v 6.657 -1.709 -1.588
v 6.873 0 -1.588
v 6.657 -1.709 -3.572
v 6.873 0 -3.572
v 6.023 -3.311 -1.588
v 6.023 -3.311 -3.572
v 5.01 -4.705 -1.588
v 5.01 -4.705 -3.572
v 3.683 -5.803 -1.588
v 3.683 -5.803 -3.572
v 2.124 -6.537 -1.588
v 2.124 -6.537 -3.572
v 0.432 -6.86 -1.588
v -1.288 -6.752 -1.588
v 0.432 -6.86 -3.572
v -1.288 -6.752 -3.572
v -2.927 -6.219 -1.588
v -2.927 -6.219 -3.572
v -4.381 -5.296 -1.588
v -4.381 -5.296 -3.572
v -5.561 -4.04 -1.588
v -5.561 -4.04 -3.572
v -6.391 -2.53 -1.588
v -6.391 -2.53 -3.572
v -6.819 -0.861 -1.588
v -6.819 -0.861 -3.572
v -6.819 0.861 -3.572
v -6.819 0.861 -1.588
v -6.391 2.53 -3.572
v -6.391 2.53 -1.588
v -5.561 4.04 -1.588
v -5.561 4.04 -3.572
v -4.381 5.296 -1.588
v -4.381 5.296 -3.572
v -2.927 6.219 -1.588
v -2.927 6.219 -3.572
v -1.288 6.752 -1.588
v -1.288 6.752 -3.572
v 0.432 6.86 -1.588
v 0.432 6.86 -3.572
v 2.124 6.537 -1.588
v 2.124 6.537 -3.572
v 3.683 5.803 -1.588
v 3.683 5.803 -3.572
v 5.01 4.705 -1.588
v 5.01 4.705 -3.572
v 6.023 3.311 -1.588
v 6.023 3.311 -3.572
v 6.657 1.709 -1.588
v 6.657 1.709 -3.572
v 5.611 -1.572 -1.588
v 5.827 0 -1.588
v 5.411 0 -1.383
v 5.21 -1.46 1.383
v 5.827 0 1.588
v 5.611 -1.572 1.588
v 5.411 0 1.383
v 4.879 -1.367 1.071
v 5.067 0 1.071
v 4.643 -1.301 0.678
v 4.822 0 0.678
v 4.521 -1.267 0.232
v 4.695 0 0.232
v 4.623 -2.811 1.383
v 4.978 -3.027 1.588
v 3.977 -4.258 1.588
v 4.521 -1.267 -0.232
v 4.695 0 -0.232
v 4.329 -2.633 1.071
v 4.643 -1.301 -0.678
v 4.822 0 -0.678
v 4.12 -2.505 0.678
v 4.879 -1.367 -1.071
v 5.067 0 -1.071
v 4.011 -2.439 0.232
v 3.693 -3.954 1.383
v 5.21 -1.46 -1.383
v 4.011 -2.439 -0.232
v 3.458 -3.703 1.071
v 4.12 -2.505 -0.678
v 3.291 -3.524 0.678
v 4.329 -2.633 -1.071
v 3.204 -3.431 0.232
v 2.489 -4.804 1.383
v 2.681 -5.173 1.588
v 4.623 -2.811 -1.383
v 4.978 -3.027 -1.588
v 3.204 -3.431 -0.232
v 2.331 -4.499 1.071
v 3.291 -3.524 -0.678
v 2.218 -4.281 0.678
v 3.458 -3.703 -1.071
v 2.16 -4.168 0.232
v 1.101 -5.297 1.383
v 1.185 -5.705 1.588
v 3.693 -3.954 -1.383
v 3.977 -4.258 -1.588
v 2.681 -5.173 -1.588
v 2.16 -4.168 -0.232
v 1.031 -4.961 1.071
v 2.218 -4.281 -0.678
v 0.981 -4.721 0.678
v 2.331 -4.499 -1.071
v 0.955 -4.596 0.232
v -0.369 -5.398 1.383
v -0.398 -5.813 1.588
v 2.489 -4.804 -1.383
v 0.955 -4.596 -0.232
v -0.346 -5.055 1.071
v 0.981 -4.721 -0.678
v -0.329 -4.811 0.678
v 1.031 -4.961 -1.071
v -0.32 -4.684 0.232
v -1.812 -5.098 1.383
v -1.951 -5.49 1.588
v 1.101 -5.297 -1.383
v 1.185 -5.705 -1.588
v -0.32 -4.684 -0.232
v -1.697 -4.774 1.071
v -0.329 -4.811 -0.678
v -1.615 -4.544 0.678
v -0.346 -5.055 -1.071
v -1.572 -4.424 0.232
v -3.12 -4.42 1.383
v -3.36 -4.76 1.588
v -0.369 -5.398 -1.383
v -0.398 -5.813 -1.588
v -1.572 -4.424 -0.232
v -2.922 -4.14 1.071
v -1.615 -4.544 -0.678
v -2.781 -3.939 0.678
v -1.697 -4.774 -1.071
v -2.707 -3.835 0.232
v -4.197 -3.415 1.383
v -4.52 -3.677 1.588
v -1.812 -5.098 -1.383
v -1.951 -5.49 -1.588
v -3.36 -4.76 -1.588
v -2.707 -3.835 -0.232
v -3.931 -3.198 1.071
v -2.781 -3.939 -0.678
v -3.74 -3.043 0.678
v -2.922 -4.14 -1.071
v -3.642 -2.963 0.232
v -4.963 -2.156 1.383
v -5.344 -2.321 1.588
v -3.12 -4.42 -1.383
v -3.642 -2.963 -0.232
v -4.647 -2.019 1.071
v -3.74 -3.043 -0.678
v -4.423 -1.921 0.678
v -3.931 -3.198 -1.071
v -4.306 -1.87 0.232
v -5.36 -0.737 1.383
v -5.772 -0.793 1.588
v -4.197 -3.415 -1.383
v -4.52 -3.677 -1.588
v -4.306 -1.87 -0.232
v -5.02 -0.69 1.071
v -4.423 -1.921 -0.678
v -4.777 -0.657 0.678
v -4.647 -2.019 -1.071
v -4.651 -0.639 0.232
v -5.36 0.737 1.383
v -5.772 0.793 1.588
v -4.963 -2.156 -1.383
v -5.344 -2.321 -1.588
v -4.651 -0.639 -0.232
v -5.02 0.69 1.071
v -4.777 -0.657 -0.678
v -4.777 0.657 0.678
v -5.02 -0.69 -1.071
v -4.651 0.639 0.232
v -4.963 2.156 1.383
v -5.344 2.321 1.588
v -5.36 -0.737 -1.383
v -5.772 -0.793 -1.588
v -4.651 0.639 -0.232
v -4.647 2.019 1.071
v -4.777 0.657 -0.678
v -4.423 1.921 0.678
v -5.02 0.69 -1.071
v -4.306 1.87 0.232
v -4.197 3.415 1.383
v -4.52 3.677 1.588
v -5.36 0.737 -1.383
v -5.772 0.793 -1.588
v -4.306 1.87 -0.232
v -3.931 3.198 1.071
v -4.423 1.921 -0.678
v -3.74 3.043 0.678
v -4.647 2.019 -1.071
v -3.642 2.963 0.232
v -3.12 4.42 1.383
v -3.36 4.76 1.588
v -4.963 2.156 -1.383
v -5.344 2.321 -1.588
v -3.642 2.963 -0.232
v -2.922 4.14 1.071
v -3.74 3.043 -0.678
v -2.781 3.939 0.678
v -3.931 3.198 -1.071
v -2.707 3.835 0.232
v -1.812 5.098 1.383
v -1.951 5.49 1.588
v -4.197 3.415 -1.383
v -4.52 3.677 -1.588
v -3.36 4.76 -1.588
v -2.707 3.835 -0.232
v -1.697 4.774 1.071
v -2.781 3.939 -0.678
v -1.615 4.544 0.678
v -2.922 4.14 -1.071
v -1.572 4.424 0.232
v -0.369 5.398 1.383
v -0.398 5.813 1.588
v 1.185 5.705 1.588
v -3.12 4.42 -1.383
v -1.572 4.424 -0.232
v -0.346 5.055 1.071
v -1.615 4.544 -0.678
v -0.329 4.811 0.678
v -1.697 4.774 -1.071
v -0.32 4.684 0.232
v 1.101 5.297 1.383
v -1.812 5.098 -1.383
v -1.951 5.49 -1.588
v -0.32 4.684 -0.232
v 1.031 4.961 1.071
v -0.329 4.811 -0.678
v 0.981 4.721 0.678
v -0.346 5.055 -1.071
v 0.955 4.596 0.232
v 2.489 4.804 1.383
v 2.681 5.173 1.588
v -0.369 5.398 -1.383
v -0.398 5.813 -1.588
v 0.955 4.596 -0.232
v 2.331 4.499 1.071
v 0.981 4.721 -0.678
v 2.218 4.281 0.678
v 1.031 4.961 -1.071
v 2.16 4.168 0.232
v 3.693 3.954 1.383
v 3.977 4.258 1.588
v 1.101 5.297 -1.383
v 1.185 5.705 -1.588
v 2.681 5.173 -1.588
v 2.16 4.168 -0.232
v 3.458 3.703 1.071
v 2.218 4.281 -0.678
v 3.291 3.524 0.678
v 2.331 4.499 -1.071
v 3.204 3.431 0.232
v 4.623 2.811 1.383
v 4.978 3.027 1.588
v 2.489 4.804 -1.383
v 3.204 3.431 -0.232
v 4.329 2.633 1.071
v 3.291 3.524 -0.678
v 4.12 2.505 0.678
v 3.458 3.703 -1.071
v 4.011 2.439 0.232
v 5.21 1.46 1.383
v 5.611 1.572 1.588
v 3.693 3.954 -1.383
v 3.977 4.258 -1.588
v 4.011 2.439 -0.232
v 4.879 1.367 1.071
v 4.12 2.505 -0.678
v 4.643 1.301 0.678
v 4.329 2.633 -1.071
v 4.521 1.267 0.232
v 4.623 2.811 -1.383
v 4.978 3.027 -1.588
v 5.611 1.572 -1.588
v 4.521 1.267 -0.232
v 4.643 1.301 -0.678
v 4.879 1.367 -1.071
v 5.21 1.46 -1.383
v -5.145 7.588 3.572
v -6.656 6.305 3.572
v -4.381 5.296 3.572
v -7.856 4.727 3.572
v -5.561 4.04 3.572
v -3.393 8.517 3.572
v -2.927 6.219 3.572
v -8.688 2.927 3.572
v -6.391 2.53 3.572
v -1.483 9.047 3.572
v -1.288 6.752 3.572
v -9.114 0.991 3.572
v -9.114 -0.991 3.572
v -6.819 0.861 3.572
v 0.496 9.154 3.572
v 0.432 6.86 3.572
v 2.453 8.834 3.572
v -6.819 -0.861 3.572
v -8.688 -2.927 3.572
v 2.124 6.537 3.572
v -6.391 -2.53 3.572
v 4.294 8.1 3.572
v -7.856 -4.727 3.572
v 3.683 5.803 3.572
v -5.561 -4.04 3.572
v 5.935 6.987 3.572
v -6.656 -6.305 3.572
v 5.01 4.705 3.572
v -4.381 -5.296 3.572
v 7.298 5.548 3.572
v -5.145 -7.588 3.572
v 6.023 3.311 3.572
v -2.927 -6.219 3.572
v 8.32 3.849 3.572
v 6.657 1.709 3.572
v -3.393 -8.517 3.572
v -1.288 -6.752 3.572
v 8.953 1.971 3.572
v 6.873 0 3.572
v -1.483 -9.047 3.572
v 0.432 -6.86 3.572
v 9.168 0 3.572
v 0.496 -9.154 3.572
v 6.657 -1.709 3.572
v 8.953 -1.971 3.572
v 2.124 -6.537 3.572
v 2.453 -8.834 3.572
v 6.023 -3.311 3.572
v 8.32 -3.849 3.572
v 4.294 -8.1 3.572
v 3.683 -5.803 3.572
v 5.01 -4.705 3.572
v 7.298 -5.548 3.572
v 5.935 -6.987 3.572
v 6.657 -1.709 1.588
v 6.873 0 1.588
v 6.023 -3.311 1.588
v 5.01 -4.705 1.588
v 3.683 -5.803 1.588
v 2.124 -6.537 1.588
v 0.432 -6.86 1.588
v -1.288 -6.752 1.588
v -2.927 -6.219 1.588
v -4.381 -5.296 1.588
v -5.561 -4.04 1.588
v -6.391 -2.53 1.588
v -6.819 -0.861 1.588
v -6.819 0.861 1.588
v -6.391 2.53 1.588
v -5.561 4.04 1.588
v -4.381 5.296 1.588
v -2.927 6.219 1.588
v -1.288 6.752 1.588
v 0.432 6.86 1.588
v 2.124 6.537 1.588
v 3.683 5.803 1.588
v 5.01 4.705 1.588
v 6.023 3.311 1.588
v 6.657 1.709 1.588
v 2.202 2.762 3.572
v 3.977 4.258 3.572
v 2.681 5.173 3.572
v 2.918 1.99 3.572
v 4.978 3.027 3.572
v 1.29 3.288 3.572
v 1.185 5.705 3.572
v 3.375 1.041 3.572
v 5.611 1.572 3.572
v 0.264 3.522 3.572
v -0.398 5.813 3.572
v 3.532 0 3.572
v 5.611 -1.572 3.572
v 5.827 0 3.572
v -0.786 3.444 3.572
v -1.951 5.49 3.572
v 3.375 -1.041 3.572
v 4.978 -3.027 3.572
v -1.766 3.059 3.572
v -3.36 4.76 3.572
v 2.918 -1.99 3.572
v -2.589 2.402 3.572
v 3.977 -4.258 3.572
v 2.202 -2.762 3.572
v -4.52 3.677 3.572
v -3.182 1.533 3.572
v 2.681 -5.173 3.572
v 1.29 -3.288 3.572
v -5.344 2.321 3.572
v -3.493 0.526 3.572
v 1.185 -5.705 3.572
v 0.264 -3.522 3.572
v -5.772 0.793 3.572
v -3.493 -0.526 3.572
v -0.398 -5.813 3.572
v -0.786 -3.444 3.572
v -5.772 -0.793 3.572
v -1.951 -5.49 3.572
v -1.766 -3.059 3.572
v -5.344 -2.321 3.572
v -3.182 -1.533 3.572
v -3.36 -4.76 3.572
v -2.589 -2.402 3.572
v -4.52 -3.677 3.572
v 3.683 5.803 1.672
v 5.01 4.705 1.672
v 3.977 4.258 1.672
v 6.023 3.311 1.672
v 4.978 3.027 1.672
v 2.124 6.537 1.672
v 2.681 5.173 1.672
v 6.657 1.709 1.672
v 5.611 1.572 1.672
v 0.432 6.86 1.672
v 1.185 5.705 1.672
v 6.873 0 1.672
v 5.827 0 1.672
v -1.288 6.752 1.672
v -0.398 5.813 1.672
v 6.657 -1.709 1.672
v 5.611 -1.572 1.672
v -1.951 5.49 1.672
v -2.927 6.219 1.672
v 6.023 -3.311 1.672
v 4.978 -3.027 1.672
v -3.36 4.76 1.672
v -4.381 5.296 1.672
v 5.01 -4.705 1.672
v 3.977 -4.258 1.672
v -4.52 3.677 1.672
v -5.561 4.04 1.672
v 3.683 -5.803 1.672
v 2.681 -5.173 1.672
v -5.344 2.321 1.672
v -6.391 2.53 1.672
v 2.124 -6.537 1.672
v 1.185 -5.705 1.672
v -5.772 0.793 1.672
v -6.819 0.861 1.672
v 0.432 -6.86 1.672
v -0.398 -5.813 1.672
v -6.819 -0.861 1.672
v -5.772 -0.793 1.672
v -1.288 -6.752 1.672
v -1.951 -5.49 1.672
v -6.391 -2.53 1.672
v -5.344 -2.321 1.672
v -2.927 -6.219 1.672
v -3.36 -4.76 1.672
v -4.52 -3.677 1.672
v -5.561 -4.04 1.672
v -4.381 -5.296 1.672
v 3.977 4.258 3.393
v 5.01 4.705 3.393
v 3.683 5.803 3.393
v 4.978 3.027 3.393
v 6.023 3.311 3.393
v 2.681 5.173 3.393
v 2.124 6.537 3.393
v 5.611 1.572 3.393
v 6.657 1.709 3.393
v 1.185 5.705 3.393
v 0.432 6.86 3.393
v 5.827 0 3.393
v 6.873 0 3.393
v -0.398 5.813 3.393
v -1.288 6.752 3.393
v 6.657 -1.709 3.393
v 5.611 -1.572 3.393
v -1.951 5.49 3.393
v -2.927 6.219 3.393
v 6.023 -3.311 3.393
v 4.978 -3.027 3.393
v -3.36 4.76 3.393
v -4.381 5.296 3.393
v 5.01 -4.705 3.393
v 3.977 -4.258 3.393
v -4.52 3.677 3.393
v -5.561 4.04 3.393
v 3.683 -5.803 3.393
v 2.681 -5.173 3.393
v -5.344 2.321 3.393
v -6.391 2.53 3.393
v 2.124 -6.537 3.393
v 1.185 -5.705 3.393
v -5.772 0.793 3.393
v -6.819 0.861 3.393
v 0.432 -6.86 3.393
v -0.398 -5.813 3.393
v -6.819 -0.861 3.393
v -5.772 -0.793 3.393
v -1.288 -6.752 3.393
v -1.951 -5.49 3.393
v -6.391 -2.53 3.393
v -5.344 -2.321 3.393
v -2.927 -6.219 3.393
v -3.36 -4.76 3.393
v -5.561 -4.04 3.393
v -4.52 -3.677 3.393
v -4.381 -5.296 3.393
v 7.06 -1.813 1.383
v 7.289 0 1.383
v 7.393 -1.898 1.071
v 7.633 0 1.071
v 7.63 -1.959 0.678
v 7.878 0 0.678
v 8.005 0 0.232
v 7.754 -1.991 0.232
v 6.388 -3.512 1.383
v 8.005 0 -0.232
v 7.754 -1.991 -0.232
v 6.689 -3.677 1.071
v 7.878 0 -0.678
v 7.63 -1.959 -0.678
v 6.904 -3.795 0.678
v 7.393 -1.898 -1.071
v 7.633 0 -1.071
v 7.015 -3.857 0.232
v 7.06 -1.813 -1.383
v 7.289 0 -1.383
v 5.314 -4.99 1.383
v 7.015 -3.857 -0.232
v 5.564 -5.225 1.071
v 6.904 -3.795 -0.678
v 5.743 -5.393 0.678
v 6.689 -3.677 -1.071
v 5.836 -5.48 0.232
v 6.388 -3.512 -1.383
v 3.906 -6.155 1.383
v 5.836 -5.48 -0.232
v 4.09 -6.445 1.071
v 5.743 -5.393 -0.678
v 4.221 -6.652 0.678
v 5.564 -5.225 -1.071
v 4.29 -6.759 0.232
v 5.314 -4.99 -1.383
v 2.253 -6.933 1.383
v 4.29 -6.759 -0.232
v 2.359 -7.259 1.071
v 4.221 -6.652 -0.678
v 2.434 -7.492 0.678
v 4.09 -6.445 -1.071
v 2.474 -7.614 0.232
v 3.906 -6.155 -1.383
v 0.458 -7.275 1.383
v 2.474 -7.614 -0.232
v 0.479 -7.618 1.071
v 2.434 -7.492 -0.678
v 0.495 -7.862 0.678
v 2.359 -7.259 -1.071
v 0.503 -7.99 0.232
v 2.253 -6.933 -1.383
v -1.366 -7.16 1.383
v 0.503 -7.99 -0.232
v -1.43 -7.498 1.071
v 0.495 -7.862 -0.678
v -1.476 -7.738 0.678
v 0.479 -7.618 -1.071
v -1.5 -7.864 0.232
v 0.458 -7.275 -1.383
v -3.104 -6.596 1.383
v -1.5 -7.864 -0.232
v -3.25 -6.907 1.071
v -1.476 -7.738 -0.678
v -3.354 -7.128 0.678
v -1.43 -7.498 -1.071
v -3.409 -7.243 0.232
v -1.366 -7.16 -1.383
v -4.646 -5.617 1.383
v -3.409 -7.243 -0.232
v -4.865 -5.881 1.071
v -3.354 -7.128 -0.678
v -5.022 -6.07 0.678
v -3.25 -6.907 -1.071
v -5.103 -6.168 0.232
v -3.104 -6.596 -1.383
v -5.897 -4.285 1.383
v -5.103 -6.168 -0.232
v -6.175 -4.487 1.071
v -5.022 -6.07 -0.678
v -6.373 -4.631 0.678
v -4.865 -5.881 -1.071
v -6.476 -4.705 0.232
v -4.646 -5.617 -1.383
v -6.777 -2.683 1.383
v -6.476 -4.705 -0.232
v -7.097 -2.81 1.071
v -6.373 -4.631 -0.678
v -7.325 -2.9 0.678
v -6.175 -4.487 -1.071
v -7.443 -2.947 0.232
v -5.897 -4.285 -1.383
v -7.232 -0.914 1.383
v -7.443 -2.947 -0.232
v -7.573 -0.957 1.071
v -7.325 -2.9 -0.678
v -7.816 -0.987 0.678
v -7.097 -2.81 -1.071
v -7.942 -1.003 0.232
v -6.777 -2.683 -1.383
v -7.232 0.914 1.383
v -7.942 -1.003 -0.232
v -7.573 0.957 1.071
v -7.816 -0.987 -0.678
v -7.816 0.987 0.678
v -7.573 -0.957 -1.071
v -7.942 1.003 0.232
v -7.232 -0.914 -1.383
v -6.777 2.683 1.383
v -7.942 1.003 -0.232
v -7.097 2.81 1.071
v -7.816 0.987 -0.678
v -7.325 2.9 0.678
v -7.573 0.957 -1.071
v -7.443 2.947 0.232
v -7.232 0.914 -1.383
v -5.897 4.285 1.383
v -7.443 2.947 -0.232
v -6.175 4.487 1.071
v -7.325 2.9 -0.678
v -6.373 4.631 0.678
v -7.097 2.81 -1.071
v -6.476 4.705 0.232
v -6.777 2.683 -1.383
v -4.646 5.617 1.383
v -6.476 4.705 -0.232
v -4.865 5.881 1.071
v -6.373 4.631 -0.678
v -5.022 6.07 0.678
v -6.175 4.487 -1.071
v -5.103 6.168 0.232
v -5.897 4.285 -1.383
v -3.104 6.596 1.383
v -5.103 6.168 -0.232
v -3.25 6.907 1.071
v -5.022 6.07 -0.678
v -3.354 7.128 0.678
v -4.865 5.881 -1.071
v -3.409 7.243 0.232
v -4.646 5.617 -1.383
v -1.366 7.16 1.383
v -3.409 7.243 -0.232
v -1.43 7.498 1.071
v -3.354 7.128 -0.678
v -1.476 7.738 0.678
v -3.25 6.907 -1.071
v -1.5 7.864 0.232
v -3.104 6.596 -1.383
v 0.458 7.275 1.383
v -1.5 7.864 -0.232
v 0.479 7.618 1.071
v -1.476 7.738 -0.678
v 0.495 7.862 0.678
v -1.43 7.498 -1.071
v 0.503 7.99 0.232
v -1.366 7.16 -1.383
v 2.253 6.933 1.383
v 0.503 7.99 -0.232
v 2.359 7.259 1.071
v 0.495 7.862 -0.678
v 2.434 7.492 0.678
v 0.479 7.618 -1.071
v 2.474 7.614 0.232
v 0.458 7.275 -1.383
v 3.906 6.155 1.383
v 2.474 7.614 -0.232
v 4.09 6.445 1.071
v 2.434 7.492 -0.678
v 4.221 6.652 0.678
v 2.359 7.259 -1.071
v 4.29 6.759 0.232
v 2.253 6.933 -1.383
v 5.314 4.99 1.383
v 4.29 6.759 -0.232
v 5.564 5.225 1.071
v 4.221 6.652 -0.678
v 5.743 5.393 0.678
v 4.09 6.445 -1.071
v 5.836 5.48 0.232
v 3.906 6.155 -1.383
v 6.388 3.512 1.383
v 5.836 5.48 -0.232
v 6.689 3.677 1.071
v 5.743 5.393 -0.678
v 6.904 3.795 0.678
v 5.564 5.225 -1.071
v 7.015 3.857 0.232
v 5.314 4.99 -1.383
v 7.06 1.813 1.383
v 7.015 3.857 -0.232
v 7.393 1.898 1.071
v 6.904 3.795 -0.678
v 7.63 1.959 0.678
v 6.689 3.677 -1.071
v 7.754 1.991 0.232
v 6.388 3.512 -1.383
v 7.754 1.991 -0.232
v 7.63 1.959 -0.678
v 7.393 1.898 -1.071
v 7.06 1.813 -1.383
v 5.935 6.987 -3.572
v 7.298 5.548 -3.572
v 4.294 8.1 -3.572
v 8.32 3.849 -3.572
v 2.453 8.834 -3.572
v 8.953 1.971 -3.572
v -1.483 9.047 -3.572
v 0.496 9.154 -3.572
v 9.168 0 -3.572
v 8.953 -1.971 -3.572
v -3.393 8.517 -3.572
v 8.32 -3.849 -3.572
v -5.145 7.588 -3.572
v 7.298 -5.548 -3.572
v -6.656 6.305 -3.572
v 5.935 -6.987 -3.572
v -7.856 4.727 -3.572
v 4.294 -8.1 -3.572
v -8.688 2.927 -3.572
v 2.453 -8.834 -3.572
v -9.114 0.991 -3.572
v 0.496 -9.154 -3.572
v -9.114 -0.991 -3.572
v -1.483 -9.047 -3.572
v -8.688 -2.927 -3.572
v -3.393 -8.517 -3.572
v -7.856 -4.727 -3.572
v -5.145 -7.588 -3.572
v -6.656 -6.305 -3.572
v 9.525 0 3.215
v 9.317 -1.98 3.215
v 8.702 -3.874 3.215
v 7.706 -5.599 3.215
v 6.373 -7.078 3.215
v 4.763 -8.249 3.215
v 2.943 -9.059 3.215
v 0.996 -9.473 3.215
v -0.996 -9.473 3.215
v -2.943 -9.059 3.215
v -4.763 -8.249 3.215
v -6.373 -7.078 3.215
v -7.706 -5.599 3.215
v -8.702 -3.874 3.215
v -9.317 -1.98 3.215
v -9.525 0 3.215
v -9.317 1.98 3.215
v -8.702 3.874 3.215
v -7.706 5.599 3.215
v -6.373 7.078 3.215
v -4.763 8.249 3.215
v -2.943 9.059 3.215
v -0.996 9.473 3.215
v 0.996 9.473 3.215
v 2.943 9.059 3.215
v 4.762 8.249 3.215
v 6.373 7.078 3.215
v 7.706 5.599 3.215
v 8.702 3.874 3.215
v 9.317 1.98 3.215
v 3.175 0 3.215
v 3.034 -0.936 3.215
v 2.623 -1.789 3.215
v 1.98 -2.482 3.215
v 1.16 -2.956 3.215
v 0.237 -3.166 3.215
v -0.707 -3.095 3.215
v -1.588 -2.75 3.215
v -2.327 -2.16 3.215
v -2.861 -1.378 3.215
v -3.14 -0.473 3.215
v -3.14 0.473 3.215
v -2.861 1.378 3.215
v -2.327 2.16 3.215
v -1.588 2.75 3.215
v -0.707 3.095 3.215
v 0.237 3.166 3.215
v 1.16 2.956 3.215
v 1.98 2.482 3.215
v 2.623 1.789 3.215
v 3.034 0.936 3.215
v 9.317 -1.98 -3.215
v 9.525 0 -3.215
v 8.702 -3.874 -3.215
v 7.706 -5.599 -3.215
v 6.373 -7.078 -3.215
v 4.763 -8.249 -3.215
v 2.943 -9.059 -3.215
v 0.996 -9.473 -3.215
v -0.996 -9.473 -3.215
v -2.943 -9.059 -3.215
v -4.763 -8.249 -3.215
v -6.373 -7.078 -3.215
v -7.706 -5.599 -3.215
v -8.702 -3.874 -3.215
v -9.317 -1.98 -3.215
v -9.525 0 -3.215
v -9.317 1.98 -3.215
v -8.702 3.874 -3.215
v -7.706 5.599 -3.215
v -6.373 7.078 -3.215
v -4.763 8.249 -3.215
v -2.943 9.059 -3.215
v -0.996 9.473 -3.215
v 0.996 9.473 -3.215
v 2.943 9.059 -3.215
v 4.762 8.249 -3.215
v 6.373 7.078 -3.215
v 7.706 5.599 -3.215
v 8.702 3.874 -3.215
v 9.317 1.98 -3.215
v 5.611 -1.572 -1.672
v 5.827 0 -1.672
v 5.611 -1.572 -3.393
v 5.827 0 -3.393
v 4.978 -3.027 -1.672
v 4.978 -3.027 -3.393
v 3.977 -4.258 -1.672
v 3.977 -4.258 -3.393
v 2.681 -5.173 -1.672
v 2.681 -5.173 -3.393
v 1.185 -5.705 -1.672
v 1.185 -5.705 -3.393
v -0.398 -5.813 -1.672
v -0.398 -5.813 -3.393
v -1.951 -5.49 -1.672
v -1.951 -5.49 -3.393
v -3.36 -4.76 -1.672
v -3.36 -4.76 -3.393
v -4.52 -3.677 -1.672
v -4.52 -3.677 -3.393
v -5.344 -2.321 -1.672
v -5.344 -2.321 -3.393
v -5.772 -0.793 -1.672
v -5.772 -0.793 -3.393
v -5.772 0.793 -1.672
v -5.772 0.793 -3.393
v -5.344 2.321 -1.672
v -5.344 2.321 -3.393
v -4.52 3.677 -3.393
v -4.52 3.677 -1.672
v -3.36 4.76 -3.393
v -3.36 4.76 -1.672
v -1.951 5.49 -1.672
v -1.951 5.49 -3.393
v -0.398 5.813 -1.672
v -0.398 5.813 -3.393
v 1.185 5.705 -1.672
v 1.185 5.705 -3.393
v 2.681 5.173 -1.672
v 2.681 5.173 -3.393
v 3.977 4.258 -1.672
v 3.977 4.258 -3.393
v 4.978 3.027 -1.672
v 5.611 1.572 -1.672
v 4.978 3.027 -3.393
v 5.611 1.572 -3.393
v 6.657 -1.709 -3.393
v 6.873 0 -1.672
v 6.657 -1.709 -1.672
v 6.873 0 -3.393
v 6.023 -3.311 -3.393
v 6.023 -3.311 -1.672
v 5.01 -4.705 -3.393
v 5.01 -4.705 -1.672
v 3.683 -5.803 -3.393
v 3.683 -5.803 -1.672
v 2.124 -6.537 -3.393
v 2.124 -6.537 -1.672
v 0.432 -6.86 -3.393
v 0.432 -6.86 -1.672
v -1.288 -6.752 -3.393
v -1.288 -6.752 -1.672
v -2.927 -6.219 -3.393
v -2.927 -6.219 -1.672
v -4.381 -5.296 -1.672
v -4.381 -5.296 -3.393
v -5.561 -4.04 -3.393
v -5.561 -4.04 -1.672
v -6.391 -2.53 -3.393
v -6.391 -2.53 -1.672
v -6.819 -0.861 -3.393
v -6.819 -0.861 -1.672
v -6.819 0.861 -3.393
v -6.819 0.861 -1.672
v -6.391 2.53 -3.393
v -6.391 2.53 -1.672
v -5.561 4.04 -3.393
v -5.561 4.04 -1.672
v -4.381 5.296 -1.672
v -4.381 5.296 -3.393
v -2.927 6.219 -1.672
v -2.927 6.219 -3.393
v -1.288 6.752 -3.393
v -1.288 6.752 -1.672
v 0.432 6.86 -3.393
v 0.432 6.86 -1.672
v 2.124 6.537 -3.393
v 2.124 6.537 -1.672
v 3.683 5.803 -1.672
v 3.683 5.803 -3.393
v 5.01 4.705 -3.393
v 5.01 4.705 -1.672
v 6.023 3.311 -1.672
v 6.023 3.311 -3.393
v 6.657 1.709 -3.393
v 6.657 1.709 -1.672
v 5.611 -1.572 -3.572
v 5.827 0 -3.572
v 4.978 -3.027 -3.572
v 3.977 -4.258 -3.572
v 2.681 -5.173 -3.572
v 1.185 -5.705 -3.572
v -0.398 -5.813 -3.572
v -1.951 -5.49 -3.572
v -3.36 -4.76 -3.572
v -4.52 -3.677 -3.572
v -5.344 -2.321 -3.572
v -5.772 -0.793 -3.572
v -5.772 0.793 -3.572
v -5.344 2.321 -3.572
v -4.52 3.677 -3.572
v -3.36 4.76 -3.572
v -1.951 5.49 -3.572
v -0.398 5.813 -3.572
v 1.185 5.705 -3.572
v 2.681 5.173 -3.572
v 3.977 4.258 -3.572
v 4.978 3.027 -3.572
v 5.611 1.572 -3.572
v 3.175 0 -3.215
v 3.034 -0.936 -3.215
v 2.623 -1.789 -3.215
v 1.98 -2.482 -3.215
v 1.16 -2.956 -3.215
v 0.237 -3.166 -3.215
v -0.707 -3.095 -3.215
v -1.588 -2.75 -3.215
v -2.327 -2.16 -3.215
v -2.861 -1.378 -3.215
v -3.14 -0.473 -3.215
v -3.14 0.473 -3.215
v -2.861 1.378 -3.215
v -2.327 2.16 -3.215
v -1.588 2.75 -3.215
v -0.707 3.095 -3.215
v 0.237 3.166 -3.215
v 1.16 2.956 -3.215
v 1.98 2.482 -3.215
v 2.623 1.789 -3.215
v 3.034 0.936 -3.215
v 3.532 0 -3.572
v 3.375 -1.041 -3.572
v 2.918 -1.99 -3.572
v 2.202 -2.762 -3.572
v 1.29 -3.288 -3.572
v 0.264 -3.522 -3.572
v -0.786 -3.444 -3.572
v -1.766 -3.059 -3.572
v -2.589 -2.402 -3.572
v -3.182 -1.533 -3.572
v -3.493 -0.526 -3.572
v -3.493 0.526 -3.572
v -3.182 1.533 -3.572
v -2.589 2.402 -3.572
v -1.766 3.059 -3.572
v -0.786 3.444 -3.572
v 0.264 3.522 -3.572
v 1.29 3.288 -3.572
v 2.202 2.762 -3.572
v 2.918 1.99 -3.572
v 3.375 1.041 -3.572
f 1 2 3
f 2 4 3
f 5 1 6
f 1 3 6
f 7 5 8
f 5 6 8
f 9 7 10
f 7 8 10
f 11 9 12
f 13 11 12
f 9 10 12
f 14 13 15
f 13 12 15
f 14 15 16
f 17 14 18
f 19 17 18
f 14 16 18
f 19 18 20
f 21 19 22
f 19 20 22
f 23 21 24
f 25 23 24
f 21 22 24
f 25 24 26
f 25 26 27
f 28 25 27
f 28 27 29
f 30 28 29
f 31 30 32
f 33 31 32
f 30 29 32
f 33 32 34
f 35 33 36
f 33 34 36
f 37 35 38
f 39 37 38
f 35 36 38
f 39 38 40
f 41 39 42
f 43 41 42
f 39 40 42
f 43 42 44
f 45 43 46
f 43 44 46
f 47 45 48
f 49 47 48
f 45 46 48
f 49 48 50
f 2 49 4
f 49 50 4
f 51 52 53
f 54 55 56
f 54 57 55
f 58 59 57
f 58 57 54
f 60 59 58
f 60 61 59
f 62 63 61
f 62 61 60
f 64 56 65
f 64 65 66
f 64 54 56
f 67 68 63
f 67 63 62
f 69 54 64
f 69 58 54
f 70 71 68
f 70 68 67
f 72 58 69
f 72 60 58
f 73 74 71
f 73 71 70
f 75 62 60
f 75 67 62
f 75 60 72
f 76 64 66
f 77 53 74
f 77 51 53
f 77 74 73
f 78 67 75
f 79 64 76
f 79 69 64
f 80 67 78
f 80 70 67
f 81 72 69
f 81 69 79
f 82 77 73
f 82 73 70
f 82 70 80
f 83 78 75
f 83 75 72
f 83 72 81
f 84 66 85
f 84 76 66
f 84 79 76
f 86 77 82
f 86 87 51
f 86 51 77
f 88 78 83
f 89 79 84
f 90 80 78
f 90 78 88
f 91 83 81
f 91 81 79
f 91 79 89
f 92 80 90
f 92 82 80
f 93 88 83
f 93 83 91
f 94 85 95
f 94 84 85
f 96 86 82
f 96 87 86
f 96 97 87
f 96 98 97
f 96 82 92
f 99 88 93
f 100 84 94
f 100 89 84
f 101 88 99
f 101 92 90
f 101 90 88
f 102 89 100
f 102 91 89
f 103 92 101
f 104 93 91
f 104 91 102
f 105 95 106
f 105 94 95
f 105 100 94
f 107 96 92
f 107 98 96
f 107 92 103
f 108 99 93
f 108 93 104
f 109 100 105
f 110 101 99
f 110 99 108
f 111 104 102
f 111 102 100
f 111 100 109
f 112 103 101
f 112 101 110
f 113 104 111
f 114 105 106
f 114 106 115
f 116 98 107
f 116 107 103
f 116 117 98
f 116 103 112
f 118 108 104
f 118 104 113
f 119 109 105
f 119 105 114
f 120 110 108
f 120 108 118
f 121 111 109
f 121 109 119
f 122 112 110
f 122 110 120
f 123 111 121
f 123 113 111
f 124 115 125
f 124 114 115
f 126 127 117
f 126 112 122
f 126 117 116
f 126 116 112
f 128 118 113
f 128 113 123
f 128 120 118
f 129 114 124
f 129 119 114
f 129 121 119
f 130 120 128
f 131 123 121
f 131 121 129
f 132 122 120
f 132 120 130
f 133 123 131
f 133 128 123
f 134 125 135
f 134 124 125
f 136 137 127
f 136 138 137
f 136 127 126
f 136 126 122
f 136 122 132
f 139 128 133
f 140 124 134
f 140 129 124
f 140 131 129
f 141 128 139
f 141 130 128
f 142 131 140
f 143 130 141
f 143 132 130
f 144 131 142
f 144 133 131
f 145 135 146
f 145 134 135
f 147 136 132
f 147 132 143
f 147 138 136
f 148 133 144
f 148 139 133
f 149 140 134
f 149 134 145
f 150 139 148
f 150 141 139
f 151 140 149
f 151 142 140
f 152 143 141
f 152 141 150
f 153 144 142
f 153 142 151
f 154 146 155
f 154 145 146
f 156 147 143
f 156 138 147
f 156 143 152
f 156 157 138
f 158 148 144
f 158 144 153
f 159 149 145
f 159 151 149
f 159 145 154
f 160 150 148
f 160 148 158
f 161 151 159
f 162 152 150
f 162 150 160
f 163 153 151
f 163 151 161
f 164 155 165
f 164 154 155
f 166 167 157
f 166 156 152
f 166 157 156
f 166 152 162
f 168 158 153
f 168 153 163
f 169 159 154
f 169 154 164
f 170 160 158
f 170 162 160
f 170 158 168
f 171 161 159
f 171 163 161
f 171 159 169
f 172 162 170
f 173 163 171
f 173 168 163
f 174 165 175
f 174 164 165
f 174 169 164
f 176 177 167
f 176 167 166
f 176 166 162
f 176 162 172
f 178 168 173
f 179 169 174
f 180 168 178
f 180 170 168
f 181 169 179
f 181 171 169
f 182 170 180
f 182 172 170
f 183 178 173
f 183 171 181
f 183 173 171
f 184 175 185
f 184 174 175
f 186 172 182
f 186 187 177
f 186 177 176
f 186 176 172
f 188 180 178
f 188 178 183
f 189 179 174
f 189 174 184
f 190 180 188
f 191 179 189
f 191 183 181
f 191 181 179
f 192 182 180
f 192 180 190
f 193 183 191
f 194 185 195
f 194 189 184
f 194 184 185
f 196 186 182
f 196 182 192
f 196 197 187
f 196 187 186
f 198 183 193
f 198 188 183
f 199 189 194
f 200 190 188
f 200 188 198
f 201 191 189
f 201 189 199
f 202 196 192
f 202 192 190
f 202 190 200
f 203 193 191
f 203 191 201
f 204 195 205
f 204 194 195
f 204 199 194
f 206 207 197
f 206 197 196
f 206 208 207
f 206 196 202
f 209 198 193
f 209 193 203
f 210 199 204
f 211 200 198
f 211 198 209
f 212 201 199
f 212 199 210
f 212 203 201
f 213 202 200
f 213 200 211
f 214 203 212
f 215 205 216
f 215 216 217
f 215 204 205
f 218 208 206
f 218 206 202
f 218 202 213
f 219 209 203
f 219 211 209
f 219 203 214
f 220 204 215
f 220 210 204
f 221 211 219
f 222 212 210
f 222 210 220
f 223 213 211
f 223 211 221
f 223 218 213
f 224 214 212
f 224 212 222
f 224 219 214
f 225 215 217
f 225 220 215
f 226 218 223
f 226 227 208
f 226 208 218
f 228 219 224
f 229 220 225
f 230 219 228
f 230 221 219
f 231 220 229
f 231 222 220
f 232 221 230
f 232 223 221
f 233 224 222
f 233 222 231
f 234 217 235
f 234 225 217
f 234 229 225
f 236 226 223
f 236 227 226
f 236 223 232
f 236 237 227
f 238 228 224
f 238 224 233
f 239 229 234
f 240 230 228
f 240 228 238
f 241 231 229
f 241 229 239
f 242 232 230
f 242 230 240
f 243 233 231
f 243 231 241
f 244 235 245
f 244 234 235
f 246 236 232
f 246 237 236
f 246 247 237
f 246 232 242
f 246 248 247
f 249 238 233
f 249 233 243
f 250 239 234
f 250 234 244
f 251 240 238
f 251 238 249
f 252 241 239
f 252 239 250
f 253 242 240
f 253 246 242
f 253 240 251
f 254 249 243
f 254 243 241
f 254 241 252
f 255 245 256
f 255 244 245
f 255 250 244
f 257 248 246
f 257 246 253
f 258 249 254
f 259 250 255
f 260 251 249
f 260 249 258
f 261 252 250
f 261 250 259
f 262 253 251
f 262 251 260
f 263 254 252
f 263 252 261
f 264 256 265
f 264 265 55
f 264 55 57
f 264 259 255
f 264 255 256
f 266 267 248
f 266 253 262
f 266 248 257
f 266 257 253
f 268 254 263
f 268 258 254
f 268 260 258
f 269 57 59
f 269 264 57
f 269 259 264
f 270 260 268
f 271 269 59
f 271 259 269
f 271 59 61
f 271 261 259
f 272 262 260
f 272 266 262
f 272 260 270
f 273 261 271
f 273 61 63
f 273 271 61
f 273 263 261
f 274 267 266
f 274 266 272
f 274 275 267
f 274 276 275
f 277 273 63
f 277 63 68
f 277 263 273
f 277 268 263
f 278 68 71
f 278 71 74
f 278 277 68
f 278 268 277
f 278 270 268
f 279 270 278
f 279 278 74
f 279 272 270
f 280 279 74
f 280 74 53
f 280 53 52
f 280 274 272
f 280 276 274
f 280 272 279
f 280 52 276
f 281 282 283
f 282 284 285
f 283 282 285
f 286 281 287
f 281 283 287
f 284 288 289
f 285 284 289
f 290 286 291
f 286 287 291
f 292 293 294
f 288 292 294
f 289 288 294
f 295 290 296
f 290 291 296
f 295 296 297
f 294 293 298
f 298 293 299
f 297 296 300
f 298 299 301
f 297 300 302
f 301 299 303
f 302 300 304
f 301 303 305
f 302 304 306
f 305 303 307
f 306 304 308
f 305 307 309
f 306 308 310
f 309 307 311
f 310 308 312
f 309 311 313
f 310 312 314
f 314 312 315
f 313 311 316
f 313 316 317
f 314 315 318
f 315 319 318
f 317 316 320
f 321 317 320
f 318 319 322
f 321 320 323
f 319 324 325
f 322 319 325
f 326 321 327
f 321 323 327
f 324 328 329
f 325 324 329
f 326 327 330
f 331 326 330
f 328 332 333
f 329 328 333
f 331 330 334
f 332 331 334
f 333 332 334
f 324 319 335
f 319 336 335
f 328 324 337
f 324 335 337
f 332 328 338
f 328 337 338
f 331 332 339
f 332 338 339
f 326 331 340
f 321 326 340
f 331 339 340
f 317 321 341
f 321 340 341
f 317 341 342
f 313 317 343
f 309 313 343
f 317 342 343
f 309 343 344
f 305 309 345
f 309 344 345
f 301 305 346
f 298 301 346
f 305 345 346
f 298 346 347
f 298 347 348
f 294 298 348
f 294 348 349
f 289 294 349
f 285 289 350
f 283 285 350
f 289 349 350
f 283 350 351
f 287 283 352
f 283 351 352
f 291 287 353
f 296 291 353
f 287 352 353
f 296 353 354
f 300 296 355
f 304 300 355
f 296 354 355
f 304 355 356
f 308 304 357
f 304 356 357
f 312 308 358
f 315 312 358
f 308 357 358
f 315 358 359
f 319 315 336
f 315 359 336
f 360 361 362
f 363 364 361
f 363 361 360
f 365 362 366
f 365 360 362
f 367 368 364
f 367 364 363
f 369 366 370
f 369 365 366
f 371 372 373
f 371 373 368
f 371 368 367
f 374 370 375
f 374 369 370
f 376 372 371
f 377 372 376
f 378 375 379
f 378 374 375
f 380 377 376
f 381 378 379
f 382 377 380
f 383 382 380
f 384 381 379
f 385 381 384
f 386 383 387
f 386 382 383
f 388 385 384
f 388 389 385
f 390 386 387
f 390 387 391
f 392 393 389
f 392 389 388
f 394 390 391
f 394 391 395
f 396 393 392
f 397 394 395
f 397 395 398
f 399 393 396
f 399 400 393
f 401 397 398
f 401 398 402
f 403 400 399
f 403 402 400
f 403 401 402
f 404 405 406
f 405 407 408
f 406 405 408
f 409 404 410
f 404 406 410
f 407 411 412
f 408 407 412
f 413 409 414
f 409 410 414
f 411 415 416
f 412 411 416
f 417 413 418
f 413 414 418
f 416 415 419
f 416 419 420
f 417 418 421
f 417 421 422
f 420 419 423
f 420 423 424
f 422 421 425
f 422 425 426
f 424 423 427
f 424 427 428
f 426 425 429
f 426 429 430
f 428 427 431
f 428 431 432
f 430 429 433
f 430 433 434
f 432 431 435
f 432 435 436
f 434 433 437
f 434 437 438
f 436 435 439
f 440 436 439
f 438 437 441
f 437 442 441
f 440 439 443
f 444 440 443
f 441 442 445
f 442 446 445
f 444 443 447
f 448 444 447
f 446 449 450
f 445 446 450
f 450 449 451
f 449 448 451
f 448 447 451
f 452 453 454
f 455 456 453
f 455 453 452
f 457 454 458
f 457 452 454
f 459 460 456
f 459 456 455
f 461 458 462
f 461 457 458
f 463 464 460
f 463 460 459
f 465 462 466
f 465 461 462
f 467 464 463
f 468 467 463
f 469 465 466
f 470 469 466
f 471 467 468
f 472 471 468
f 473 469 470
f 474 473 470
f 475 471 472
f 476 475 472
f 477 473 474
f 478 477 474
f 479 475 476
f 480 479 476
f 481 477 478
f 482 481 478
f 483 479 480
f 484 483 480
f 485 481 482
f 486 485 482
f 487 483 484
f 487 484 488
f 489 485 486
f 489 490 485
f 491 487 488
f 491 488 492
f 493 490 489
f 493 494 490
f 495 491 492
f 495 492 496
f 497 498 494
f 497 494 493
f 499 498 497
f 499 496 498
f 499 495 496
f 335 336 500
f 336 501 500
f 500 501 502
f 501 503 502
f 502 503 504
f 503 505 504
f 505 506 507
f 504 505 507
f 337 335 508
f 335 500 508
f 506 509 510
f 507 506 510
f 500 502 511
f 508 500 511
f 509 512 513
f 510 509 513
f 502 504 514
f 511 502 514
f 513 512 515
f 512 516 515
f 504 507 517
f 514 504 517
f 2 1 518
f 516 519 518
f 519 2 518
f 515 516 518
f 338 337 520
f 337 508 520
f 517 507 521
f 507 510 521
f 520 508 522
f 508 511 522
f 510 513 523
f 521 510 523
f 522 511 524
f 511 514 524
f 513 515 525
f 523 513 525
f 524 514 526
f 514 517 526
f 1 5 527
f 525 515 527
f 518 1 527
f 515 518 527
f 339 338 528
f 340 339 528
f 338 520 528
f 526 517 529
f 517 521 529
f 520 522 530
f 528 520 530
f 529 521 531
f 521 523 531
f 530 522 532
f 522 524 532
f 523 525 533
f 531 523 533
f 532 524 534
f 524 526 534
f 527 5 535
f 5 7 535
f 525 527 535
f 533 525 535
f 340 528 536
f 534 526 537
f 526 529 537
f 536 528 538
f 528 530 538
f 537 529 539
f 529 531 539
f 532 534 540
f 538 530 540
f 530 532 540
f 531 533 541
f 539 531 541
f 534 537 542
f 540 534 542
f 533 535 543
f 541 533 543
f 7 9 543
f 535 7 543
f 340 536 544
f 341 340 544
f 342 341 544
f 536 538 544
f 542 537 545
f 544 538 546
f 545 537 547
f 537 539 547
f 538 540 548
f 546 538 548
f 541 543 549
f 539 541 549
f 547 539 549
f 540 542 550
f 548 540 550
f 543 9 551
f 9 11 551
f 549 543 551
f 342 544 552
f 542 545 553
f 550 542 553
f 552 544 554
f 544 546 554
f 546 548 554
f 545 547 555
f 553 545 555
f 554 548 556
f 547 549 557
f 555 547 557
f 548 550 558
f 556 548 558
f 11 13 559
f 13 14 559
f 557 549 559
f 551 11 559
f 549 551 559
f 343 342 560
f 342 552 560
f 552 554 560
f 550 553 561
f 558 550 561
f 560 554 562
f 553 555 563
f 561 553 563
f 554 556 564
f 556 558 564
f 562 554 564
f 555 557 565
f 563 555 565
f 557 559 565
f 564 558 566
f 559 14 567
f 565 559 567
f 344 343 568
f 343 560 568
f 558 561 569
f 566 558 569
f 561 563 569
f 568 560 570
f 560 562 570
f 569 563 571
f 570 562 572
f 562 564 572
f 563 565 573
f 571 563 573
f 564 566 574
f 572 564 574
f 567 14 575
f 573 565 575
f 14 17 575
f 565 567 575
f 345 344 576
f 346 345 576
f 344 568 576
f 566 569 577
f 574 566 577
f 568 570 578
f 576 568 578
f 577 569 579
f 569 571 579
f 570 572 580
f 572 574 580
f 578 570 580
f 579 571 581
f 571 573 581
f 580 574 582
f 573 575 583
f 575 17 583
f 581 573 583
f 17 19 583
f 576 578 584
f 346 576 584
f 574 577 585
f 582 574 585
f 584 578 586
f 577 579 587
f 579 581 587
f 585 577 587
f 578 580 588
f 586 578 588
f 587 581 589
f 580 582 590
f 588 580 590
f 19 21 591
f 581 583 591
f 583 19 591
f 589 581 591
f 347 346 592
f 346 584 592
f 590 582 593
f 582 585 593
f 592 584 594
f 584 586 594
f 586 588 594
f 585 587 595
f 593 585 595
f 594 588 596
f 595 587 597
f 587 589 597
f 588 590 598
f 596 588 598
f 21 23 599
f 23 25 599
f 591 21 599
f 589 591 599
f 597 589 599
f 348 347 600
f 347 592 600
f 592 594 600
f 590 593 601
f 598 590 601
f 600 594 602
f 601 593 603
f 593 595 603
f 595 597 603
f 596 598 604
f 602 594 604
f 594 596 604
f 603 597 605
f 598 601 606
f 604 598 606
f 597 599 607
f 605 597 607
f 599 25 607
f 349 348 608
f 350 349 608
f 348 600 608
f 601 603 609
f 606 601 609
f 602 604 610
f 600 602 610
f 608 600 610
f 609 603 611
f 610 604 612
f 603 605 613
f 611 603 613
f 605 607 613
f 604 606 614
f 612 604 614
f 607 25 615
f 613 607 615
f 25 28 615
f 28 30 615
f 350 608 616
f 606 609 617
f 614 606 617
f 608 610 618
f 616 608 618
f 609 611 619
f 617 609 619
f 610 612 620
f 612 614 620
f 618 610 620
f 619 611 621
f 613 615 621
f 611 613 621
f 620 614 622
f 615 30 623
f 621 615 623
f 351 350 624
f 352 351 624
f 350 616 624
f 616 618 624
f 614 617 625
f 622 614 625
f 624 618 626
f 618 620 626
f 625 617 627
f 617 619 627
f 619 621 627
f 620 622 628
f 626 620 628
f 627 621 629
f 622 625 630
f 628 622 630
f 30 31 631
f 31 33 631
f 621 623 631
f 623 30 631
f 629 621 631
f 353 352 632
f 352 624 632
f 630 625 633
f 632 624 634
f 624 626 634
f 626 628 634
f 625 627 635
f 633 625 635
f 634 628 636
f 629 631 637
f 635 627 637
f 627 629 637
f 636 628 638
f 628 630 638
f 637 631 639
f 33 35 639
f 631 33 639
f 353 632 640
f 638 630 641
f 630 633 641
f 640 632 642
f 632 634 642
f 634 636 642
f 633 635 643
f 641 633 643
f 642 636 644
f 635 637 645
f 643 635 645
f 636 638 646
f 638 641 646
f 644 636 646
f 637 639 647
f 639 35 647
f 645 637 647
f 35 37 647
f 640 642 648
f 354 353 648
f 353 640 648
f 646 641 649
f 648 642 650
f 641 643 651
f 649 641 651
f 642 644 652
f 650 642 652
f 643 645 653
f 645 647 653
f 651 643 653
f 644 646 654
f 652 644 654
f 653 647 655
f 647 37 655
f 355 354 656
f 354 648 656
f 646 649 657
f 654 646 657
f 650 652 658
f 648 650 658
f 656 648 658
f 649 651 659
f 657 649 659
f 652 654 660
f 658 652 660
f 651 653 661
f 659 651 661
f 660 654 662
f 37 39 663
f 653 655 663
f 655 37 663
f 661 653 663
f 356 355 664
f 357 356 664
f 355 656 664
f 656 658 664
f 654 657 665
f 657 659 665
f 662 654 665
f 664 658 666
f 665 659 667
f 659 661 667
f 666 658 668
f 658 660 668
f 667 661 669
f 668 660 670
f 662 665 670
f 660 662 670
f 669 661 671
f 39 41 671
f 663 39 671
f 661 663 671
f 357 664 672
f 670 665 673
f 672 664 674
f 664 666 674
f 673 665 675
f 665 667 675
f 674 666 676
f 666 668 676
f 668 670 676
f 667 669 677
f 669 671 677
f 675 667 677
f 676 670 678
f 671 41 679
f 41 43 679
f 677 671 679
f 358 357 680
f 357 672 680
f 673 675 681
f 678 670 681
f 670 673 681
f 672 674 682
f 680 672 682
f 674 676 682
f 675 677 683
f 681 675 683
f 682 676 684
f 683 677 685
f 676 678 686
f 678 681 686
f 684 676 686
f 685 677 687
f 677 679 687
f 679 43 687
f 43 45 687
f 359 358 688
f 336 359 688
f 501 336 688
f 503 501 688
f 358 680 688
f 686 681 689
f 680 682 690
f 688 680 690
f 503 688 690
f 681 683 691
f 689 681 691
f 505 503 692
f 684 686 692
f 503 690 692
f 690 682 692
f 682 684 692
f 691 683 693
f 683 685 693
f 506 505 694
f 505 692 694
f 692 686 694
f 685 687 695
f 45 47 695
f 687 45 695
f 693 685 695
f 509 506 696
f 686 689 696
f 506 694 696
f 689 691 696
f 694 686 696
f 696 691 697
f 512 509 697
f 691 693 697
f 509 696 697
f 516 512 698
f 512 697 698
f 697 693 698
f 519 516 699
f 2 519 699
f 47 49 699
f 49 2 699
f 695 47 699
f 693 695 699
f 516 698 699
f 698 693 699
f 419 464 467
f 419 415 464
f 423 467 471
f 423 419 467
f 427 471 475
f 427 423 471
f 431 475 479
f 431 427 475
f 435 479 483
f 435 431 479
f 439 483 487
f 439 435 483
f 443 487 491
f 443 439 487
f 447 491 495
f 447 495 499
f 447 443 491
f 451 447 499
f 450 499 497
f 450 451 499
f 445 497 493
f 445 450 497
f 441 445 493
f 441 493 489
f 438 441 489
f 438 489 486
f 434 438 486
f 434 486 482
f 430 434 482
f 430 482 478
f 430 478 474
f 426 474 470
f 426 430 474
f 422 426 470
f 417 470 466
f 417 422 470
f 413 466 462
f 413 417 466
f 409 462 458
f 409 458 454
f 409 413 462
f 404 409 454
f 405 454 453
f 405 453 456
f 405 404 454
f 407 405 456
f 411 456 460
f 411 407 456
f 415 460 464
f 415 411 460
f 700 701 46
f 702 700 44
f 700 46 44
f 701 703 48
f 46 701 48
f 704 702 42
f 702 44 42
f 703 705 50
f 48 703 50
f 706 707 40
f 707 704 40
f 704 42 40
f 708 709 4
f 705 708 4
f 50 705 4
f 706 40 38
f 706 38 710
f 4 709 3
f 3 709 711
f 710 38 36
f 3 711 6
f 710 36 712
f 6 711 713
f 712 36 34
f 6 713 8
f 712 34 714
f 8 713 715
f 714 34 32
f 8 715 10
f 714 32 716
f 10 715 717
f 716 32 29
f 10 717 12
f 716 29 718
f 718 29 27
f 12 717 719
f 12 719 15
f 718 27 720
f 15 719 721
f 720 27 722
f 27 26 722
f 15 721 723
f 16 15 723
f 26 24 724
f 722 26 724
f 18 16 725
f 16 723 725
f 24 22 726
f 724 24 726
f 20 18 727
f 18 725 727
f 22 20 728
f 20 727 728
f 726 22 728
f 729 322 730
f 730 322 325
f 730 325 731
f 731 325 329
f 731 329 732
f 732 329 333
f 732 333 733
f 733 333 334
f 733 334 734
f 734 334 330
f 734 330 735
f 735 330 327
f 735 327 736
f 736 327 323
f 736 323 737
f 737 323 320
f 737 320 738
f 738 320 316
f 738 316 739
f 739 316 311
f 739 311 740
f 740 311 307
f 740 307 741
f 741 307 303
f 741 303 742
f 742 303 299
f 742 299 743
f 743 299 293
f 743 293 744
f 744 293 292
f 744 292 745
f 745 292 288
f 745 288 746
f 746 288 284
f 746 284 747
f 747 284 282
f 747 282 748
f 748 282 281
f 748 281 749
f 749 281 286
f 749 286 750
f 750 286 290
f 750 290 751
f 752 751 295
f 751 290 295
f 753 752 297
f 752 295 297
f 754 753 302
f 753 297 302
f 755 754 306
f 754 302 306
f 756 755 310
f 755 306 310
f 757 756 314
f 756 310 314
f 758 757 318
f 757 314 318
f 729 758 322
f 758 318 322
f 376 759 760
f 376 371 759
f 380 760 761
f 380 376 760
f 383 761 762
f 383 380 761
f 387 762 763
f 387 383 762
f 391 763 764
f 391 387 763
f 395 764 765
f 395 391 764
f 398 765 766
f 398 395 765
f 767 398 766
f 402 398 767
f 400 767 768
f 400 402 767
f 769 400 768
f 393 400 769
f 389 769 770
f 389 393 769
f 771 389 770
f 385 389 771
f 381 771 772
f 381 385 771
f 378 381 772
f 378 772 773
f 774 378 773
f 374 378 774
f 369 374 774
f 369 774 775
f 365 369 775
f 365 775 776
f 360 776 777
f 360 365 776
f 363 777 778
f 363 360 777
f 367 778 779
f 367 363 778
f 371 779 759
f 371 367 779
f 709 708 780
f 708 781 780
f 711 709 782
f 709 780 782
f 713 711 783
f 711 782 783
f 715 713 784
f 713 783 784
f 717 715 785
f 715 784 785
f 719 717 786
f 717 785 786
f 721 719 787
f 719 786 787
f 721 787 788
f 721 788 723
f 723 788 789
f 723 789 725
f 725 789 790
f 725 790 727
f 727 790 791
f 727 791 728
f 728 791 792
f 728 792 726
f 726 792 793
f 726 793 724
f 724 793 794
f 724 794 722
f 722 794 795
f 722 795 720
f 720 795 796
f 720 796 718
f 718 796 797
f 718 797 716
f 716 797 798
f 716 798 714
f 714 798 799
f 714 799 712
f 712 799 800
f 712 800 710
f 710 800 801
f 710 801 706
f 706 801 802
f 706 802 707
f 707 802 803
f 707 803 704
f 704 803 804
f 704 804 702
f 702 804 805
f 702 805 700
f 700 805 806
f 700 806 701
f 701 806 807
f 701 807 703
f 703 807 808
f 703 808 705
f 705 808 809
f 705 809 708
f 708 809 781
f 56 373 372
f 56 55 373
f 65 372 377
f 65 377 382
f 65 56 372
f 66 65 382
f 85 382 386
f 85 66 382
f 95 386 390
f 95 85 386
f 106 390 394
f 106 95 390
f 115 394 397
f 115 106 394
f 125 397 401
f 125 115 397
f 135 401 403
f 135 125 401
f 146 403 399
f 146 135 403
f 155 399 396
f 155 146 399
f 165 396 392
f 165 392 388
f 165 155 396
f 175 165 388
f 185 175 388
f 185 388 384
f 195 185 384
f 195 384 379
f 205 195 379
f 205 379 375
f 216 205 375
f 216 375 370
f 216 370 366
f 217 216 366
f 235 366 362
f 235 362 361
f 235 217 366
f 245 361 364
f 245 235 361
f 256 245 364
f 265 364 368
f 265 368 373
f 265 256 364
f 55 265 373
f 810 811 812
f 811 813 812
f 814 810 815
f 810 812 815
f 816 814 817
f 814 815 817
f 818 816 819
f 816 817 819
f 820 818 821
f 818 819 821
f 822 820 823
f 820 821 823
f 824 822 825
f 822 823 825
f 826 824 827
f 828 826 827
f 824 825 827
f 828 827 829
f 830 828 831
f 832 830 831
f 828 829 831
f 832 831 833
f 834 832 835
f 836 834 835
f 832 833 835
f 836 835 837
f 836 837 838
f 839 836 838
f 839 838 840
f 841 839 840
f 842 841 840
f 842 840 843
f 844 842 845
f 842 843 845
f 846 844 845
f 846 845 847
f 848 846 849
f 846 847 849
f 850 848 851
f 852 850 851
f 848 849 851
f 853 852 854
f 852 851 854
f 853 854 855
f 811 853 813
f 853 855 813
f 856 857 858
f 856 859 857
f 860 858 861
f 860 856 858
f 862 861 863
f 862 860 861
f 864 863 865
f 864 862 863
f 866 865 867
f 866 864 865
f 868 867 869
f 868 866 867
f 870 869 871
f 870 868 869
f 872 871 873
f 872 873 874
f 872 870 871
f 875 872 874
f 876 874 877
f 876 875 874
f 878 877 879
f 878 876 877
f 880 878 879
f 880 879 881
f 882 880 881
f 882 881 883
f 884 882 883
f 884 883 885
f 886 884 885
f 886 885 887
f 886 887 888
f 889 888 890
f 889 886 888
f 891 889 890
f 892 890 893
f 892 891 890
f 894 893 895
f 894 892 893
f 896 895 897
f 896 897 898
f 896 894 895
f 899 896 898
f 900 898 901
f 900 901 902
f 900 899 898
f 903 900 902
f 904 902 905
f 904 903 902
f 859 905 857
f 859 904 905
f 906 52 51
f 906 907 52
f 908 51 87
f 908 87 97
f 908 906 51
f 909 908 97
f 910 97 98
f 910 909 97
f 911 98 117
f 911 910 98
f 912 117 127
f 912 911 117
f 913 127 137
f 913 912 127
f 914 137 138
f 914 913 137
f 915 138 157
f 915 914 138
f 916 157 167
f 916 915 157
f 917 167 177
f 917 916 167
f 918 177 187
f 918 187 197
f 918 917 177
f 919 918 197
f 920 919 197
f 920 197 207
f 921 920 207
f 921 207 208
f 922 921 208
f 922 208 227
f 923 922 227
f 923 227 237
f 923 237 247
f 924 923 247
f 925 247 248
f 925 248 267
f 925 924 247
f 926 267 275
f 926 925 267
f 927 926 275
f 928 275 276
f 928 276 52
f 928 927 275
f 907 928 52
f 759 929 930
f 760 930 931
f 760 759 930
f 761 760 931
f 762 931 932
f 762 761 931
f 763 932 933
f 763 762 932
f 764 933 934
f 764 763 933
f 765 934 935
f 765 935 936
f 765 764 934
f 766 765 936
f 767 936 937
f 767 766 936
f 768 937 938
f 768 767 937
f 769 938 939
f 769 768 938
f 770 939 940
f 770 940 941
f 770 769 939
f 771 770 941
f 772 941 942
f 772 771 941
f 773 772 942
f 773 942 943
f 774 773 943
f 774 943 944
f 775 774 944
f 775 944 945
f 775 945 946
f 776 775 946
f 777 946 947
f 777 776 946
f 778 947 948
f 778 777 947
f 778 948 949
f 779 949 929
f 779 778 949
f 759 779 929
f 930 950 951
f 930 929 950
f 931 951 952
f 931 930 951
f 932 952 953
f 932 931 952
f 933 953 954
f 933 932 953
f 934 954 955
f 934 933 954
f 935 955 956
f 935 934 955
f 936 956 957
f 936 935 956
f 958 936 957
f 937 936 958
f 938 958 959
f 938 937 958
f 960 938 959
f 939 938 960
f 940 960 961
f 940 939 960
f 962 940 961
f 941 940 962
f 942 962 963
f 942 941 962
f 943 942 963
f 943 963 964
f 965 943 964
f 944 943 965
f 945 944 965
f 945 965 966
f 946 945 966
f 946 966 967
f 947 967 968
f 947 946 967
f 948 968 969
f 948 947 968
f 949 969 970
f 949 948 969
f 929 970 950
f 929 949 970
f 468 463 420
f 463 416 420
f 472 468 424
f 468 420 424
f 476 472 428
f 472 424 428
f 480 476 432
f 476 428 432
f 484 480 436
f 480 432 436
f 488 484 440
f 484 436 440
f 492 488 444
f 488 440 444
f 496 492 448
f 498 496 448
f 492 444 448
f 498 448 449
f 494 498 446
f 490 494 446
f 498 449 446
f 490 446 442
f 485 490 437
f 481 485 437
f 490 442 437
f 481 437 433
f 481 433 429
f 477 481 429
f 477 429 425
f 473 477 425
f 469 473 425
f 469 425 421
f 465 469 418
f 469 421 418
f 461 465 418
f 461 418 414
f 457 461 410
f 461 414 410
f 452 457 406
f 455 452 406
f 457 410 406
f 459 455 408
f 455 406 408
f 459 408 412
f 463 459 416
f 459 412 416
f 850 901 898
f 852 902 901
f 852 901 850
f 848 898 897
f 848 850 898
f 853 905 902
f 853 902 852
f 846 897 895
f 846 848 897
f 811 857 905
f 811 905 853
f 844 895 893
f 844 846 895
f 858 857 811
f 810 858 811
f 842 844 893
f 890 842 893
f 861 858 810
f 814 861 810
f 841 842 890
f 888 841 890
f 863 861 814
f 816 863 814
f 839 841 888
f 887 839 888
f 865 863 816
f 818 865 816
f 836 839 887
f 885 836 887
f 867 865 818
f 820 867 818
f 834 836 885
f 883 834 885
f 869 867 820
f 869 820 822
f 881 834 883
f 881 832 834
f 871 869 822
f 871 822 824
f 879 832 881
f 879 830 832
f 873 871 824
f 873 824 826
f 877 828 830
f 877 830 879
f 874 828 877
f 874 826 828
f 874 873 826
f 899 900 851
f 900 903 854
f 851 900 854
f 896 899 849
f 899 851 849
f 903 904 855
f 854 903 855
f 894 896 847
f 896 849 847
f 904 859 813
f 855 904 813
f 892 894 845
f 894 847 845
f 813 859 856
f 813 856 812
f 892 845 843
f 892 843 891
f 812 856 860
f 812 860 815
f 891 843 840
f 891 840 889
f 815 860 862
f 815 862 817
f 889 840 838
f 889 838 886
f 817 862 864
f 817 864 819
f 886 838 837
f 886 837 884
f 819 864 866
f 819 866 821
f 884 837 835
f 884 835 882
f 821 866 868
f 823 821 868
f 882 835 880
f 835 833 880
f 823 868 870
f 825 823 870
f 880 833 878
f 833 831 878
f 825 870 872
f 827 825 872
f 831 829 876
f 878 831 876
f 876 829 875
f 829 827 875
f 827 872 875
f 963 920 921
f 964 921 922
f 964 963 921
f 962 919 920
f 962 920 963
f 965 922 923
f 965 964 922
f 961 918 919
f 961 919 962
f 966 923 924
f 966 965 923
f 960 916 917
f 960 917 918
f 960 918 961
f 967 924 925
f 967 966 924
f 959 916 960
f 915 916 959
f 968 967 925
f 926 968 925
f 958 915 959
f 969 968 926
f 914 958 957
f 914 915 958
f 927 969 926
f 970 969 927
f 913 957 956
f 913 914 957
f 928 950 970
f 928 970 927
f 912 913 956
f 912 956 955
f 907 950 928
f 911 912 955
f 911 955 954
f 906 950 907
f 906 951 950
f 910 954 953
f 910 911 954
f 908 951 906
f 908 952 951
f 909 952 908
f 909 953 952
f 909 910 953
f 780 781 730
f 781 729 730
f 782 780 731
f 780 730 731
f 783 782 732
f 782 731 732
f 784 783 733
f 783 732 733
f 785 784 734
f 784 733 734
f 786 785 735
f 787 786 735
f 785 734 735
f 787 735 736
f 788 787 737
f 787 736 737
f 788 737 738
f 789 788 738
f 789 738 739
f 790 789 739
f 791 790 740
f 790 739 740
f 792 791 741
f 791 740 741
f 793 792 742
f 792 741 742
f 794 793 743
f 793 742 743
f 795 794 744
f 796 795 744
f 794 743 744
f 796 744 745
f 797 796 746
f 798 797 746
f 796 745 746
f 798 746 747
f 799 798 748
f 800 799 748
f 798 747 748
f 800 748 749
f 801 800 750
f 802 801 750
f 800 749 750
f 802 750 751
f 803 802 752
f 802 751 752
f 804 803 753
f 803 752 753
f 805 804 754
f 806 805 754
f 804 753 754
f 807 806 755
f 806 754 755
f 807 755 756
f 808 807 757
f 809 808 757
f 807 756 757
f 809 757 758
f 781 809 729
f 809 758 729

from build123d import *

# Parameters (mm, degrees)
SKETCH5_W = 1.721739088
SKETCH5_H = 1.046703296


with BuildPart() as part:
    # Sketch1 → Revolve1 (revolve)
    with BuildSketch(Plane(origin=(0, 0, 0), x_dir=(0, 0, -1), z_dir=(1, 0, 0))):
        with BuildLine():
            Line((3.2146875, 9.525), (-3.2146875, 9.525))
            Line((-3.2146875, 9.525), (-3.571875, 9.1678125))
            Line((-3.571875, 9.1678125), (-3.571875, 6.873351648))
            Line((-3.571875, 6.873351648), (-1.5875, 6.873351648))
            ThreePointArc((-1.5875, 6.873351648), (0, 8.021542162), (1.5875, 6.873351648))
            Line((1.5875, 6.873351648), (3.571875, 6.873351648))
            Line((3.571875, 6.873351648), (3.571875, 9.1678125))
            Line((3.571875, 9.1678125), (3.2146875, 9.525))
        make_face()
    revolve(axis=Axis((0, 0, 3.571875), (0, 0, -1)))


with BuildPart() as body_2:
    # Sketch3 → Revolve3 (revolve)
    with BuildSketch(Plane(origin=(0, 0, 0), x_dir=(0, 0, -1), z_dir=(1, 0, 0))):
        with BuildLine():
            Line((-3.571875, 5.826648352), (-1.5875, 5.826648352))
            ThreePointArc((-1.5875, 5.826648352), (0, 4.678457838), (1.5875, 5.826648352))
            Line((1.5875, 5.826648352), (3.571875, 5.826648352))
            Line((3.571875, 5.826648352), (3.571875, 3.5321875))
            Line((3.571875, 3.5321875), (3.2146875, 3.175))
            Line((3.2146875, 3.175), (-3.2146875, 3.175))
            Line((-3.2146875, 3.175), (-3.571875, 3.5321875))
            Line((-3.571875, 3.5321875), (-3.571875, 5.826648352))
        make_face()
    revolve(axis=Axis((0, 0, 3.571875), (0, 0, -1)))


with BuildPart() as body_3:
    # Sketch5 → Revolve5 (revolve)
    with BuildSketch(Plane(origin=(0, 0, 0), x_dir=(0, 0, -1), z_dir=(1, 0, 0))):
        with Locations((-2.532411706, 6.35)):
            Rectangle(SKETCH5_W, SKETCH5_H)
        with Locations((2.532411706, 6.35)):
            Rectangle(SKETCH5_W, SKETCH5_H)
    revolve(axis=Axis((0, 0, 3.571875), (0, 0, -1)))


solid = Compound([part.part, body_2.part, body_3.part])
